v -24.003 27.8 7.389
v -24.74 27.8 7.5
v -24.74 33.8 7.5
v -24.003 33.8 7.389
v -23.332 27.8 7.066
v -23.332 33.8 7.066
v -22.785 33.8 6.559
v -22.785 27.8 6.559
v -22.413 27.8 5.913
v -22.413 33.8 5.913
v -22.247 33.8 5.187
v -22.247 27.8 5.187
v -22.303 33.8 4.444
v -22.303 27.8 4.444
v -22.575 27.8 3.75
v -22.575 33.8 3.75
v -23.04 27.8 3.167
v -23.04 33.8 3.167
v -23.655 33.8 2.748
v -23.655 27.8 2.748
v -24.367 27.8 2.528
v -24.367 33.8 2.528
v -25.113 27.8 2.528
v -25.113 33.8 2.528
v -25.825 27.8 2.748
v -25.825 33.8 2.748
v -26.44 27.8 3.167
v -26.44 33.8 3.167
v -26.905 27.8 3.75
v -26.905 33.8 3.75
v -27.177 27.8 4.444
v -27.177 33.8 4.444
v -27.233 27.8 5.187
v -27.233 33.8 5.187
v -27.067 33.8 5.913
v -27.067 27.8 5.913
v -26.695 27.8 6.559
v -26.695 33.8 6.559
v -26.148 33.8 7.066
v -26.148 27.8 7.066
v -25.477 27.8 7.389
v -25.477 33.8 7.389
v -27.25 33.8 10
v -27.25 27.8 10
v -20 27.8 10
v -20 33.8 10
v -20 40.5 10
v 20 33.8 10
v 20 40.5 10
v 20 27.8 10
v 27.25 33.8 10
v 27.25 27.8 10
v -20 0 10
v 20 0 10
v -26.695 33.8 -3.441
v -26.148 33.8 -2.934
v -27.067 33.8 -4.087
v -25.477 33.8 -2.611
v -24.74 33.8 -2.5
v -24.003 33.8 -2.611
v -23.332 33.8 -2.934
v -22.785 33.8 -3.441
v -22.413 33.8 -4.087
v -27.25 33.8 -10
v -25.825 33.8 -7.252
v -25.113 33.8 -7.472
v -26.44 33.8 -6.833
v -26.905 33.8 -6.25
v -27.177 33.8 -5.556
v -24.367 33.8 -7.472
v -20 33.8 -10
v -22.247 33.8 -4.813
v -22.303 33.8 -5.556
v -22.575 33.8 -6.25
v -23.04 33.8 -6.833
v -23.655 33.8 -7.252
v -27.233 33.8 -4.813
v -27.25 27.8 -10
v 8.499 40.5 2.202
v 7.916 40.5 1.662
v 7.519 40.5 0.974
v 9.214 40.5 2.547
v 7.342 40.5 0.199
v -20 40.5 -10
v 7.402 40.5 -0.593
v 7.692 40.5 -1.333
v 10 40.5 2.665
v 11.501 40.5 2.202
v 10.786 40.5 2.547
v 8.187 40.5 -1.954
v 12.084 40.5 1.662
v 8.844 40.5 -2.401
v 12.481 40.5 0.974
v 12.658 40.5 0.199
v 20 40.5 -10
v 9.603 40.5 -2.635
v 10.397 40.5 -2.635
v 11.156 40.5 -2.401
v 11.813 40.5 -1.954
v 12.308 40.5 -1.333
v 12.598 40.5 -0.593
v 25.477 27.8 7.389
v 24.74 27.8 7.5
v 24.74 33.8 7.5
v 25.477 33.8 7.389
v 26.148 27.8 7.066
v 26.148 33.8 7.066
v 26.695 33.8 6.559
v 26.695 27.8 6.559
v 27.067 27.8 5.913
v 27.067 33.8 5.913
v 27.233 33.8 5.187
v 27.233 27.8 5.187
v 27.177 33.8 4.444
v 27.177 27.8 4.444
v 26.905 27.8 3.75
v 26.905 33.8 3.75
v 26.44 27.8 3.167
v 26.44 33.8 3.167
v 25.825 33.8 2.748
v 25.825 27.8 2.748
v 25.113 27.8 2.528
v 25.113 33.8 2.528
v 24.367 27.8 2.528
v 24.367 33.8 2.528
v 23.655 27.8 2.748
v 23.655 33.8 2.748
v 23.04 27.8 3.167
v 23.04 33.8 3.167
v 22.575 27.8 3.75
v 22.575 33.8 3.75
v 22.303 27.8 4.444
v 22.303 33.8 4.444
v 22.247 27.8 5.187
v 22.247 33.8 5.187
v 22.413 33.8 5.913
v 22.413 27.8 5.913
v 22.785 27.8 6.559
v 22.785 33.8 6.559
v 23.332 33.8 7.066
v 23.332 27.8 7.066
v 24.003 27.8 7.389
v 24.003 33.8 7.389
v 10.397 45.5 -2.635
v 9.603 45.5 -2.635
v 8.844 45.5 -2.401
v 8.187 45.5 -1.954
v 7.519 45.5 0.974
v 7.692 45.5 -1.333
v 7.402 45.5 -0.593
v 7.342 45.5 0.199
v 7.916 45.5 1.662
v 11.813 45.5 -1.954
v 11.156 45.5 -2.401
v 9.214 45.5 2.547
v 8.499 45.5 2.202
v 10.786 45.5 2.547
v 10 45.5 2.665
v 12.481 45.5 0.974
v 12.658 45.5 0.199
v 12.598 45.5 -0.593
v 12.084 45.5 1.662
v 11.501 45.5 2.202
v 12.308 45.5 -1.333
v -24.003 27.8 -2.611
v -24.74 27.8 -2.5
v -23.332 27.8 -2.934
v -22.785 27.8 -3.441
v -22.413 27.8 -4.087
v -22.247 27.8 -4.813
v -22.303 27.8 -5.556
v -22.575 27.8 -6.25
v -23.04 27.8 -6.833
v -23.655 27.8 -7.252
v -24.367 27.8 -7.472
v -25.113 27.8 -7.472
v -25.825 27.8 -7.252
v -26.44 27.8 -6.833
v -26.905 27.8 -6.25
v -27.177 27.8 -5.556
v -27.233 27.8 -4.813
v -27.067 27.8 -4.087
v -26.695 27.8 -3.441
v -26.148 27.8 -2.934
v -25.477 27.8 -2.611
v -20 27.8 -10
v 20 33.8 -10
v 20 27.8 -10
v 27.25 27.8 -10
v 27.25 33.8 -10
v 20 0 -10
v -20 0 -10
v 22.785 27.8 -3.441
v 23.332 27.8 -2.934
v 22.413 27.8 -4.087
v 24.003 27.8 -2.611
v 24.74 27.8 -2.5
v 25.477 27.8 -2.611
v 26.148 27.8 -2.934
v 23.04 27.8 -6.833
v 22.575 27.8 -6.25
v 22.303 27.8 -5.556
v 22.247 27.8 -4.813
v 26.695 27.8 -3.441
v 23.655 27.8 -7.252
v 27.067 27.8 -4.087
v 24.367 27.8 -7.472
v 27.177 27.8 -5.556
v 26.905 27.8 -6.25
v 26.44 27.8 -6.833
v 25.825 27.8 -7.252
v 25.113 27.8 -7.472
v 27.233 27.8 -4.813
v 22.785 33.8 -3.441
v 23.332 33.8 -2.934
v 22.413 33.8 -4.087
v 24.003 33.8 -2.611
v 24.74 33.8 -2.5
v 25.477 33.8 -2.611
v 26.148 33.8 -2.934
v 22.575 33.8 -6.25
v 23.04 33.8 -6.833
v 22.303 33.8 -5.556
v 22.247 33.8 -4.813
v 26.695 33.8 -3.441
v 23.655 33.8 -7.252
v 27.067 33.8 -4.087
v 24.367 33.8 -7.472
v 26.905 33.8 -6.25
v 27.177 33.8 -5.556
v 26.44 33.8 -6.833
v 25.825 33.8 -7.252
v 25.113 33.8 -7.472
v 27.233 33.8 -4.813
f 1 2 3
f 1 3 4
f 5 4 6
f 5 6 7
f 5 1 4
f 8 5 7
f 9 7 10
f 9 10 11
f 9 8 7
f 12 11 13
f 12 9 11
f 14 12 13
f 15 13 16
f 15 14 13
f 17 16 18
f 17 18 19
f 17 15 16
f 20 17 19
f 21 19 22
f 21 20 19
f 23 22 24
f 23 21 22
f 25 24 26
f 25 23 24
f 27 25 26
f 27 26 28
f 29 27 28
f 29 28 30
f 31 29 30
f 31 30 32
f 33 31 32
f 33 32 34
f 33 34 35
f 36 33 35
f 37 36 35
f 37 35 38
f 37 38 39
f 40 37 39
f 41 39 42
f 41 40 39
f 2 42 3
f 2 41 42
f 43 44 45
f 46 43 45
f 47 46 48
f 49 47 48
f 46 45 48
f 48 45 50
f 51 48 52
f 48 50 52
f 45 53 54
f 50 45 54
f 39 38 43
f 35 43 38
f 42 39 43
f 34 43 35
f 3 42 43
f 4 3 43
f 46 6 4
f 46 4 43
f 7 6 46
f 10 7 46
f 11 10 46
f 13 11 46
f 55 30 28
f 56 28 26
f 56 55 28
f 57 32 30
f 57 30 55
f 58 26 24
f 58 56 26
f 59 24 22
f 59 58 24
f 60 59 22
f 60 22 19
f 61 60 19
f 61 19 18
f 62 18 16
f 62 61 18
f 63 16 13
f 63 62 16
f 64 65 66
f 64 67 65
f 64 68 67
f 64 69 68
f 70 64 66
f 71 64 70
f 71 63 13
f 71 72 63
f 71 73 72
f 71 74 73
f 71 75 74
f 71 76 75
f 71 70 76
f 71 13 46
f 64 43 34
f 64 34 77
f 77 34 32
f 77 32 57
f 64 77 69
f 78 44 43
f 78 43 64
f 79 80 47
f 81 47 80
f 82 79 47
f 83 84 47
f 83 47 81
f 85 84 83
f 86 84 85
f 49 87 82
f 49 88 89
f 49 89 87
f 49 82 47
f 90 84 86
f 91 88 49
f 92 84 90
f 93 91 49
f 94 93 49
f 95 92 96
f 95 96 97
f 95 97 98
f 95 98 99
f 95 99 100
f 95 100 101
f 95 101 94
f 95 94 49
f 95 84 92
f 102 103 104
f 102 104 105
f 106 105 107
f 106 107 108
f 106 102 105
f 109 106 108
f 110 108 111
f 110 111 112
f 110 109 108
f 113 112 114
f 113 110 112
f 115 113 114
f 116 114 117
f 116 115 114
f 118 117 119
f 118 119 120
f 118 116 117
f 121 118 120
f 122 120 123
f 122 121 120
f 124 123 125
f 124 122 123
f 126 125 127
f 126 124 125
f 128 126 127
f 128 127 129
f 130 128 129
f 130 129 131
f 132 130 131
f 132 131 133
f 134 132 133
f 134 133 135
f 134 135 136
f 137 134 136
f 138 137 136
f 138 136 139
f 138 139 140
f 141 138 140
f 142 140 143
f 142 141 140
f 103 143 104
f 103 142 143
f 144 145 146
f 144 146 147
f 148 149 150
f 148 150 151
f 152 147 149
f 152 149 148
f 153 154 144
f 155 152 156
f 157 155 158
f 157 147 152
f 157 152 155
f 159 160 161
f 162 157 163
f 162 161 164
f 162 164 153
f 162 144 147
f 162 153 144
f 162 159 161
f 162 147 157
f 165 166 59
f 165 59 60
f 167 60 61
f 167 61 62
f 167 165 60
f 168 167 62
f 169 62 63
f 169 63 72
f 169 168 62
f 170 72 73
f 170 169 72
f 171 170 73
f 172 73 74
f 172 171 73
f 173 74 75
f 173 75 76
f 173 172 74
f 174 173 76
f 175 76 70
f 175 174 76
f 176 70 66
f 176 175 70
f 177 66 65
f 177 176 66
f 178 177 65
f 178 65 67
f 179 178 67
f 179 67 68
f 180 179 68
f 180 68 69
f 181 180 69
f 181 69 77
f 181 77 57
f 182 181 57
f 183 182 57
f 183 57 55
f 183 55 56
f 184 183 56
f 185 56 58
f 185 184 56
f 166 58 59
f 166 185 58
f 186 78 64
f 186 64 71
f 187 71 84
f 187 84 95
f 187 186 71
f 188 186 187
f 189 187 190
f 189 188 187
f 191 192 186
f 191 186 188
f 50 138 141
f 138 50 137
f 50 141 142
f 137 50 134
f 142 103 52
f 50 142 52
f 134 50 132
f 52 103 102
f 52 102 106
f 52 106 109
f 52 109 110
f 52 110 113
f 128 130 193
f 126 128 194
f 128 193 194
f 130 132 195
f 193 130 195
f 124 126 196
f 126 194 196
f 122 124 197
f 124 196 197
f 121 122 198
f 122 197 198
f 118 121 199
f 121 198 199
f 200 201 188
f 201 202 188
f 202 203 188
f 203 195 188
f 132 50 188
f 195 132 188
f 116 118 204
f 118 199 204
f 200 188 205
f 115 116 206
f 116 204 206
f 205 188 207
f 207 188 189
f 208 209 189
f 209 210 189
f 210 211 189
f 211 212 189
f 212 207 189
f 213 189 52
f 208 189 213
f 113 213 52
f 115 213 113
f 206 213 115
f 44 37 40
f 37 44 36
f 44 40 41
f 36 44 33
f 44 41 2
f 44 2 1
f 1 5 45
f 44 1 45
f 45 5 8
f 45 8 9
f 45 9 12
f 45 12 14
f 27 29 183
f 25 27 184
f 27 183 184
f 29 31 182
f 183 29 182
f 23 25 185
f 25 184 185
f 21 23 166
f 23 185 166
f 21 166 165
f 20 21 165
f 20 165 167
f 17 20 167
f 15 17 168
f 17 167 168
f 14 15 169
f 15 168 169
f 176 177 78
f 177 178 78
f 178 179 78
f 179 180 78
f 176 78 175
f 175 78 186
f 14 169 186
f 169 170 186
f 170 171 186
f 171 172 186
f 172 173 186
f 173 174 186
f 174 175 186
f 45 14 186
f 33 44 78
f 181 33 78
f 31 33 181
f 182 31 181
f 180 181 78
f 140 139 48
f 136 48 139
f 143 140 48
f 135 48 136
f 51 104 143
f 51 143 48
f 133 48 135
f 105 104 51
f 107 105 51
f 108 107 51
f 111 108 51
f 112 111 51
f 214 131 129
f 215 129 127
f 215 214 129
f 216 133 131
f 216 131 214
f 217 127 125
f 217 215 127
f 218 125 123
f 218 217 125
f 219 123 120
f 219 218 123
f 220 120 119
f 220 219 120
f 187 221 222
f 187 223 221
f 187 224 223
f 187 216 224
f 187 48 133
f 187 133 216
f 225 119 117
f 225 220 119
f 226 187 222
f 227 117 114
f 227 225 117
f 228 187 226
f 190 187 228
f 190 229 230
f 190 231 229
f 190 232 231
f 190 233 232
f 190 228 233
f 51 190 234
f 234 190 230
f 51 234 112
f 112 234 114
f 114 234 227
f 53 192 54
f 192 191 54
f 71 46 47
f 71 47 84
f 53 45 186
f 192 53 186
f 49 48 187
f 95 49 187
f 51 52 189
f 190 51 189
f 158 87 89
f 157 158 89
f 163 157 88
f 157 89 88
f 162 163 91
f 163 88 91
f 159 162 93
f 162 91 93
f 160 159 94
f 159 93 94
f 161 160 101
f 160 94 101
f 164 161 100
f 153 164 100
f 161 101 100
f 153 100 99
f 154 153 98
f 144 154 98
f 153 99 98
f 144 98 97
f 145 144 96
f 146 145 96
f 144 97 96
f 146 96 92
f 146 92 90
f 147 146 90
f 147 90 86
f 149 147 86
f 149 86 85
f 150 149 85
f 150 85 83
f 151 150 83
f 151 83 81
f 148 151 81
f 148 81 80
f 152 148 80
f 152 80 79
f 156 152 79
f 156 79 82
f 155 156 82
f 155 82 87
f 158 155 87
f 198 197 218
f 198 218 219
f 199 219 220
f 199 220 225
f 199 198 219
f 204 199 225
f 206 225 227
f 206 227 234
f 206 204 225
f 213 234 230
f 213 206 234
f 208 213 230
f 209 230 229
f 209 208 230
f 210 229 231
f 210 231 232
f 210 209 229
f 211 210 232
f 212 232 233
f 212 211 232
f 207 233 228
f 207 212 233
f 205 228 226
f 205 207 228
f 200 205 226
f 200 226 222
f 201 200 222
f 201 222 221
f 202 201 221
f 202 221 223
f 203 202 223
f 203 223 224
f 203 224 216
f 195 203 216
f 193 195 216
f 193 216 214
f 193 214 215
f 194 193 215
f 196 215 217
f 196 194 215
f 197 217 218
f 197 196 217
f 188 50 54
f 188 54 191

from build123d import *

# Parameters (mm, degrees)
SKETCH2_W           = 40
SKETCH2_H           = 20
BOSS_EXTRUDE1_DEPTH = 40.5
BOSS_EXTRUDE3_START = 27.8
SKETCH2_5_W         = 7.25
SKETCH2_5_H         = 20
SKETCH2_5_R         = 2.5
BOSS_EXTRUDE3_DEPTH = 6
SKETCH2_6_R         = 2.665211454
BOSS_EXTRUDE4_DEPTH = 45.5


with BuildPart() as part:
    # Sketch2 → Boss-Extrude1 (new body)
    with BuildSketch(Plane(origin=(0, 0, 0), x_dir=(1, 0, 0), z_dir=(0, 1, 0))):
        Rectangle(SKETCH2_W, SKETCH2_H)
    extrude(amount=BOSS_EXTRUDE1_DEPTH)

    # Sketch2<5> → Boss-Extrude3 (add)
    # profile 1 of 2: a face of its own
    with BuildSketch(Plane(origin=(0, 0, 0), x_dir=(1, 0, 0), z_dir=(0, 1, 0)).offset(BOSS_EXTRUDE3_START)):
        with Locations((-23.625, 0)):
            Rectangle(SKETCH2_5_W, SKETCH2_5_H)
        with Locations((-24.74, -5)):
            Circle(SKETCH2_5_R, mode=Mode.SUBTRACT)
        with Locations((-24.74, 5)):
            Circle(SKETCH2_5_R, mode=Mode.SUBTRACT)
    # profile 2 of 2: a face of its own
    with BuildSketch(Plane(origin=(0, 0, 0), x_dir=(1, 0, 0), z_dir=(0, 1, 0)).offset(BOSS_EXTRUDE3_START)):
        with Locations((23.625, 0)):
            Rectangle(SKETCH2_5_W, SKETCH2_5_H)
        with Locations((24.74, -5)):
            Circle(SKETCH2_5_R, mode=Mode.SUBTRACT)
        with Locations((24.74, 5)):
            Circle(SKETCH2_5_R, mode=Mode.SUBTRACT)
    extrude(amount=BOSS_EXTRUDE3_DEPTH)

    # Sketch2<6> → Boss-Extrude4 (add)
    with BuildSketch(Plane(origin=(0, 0, 0), x_dir=(1, 0, 0), z_dir=(0, 1, 0))):
        with Locations((10, 0)):
            Circle(SKETCH2_6_R)
    extrude(amount=BOSS_EXTRUDE4_DEPTH)


solid = part.part
